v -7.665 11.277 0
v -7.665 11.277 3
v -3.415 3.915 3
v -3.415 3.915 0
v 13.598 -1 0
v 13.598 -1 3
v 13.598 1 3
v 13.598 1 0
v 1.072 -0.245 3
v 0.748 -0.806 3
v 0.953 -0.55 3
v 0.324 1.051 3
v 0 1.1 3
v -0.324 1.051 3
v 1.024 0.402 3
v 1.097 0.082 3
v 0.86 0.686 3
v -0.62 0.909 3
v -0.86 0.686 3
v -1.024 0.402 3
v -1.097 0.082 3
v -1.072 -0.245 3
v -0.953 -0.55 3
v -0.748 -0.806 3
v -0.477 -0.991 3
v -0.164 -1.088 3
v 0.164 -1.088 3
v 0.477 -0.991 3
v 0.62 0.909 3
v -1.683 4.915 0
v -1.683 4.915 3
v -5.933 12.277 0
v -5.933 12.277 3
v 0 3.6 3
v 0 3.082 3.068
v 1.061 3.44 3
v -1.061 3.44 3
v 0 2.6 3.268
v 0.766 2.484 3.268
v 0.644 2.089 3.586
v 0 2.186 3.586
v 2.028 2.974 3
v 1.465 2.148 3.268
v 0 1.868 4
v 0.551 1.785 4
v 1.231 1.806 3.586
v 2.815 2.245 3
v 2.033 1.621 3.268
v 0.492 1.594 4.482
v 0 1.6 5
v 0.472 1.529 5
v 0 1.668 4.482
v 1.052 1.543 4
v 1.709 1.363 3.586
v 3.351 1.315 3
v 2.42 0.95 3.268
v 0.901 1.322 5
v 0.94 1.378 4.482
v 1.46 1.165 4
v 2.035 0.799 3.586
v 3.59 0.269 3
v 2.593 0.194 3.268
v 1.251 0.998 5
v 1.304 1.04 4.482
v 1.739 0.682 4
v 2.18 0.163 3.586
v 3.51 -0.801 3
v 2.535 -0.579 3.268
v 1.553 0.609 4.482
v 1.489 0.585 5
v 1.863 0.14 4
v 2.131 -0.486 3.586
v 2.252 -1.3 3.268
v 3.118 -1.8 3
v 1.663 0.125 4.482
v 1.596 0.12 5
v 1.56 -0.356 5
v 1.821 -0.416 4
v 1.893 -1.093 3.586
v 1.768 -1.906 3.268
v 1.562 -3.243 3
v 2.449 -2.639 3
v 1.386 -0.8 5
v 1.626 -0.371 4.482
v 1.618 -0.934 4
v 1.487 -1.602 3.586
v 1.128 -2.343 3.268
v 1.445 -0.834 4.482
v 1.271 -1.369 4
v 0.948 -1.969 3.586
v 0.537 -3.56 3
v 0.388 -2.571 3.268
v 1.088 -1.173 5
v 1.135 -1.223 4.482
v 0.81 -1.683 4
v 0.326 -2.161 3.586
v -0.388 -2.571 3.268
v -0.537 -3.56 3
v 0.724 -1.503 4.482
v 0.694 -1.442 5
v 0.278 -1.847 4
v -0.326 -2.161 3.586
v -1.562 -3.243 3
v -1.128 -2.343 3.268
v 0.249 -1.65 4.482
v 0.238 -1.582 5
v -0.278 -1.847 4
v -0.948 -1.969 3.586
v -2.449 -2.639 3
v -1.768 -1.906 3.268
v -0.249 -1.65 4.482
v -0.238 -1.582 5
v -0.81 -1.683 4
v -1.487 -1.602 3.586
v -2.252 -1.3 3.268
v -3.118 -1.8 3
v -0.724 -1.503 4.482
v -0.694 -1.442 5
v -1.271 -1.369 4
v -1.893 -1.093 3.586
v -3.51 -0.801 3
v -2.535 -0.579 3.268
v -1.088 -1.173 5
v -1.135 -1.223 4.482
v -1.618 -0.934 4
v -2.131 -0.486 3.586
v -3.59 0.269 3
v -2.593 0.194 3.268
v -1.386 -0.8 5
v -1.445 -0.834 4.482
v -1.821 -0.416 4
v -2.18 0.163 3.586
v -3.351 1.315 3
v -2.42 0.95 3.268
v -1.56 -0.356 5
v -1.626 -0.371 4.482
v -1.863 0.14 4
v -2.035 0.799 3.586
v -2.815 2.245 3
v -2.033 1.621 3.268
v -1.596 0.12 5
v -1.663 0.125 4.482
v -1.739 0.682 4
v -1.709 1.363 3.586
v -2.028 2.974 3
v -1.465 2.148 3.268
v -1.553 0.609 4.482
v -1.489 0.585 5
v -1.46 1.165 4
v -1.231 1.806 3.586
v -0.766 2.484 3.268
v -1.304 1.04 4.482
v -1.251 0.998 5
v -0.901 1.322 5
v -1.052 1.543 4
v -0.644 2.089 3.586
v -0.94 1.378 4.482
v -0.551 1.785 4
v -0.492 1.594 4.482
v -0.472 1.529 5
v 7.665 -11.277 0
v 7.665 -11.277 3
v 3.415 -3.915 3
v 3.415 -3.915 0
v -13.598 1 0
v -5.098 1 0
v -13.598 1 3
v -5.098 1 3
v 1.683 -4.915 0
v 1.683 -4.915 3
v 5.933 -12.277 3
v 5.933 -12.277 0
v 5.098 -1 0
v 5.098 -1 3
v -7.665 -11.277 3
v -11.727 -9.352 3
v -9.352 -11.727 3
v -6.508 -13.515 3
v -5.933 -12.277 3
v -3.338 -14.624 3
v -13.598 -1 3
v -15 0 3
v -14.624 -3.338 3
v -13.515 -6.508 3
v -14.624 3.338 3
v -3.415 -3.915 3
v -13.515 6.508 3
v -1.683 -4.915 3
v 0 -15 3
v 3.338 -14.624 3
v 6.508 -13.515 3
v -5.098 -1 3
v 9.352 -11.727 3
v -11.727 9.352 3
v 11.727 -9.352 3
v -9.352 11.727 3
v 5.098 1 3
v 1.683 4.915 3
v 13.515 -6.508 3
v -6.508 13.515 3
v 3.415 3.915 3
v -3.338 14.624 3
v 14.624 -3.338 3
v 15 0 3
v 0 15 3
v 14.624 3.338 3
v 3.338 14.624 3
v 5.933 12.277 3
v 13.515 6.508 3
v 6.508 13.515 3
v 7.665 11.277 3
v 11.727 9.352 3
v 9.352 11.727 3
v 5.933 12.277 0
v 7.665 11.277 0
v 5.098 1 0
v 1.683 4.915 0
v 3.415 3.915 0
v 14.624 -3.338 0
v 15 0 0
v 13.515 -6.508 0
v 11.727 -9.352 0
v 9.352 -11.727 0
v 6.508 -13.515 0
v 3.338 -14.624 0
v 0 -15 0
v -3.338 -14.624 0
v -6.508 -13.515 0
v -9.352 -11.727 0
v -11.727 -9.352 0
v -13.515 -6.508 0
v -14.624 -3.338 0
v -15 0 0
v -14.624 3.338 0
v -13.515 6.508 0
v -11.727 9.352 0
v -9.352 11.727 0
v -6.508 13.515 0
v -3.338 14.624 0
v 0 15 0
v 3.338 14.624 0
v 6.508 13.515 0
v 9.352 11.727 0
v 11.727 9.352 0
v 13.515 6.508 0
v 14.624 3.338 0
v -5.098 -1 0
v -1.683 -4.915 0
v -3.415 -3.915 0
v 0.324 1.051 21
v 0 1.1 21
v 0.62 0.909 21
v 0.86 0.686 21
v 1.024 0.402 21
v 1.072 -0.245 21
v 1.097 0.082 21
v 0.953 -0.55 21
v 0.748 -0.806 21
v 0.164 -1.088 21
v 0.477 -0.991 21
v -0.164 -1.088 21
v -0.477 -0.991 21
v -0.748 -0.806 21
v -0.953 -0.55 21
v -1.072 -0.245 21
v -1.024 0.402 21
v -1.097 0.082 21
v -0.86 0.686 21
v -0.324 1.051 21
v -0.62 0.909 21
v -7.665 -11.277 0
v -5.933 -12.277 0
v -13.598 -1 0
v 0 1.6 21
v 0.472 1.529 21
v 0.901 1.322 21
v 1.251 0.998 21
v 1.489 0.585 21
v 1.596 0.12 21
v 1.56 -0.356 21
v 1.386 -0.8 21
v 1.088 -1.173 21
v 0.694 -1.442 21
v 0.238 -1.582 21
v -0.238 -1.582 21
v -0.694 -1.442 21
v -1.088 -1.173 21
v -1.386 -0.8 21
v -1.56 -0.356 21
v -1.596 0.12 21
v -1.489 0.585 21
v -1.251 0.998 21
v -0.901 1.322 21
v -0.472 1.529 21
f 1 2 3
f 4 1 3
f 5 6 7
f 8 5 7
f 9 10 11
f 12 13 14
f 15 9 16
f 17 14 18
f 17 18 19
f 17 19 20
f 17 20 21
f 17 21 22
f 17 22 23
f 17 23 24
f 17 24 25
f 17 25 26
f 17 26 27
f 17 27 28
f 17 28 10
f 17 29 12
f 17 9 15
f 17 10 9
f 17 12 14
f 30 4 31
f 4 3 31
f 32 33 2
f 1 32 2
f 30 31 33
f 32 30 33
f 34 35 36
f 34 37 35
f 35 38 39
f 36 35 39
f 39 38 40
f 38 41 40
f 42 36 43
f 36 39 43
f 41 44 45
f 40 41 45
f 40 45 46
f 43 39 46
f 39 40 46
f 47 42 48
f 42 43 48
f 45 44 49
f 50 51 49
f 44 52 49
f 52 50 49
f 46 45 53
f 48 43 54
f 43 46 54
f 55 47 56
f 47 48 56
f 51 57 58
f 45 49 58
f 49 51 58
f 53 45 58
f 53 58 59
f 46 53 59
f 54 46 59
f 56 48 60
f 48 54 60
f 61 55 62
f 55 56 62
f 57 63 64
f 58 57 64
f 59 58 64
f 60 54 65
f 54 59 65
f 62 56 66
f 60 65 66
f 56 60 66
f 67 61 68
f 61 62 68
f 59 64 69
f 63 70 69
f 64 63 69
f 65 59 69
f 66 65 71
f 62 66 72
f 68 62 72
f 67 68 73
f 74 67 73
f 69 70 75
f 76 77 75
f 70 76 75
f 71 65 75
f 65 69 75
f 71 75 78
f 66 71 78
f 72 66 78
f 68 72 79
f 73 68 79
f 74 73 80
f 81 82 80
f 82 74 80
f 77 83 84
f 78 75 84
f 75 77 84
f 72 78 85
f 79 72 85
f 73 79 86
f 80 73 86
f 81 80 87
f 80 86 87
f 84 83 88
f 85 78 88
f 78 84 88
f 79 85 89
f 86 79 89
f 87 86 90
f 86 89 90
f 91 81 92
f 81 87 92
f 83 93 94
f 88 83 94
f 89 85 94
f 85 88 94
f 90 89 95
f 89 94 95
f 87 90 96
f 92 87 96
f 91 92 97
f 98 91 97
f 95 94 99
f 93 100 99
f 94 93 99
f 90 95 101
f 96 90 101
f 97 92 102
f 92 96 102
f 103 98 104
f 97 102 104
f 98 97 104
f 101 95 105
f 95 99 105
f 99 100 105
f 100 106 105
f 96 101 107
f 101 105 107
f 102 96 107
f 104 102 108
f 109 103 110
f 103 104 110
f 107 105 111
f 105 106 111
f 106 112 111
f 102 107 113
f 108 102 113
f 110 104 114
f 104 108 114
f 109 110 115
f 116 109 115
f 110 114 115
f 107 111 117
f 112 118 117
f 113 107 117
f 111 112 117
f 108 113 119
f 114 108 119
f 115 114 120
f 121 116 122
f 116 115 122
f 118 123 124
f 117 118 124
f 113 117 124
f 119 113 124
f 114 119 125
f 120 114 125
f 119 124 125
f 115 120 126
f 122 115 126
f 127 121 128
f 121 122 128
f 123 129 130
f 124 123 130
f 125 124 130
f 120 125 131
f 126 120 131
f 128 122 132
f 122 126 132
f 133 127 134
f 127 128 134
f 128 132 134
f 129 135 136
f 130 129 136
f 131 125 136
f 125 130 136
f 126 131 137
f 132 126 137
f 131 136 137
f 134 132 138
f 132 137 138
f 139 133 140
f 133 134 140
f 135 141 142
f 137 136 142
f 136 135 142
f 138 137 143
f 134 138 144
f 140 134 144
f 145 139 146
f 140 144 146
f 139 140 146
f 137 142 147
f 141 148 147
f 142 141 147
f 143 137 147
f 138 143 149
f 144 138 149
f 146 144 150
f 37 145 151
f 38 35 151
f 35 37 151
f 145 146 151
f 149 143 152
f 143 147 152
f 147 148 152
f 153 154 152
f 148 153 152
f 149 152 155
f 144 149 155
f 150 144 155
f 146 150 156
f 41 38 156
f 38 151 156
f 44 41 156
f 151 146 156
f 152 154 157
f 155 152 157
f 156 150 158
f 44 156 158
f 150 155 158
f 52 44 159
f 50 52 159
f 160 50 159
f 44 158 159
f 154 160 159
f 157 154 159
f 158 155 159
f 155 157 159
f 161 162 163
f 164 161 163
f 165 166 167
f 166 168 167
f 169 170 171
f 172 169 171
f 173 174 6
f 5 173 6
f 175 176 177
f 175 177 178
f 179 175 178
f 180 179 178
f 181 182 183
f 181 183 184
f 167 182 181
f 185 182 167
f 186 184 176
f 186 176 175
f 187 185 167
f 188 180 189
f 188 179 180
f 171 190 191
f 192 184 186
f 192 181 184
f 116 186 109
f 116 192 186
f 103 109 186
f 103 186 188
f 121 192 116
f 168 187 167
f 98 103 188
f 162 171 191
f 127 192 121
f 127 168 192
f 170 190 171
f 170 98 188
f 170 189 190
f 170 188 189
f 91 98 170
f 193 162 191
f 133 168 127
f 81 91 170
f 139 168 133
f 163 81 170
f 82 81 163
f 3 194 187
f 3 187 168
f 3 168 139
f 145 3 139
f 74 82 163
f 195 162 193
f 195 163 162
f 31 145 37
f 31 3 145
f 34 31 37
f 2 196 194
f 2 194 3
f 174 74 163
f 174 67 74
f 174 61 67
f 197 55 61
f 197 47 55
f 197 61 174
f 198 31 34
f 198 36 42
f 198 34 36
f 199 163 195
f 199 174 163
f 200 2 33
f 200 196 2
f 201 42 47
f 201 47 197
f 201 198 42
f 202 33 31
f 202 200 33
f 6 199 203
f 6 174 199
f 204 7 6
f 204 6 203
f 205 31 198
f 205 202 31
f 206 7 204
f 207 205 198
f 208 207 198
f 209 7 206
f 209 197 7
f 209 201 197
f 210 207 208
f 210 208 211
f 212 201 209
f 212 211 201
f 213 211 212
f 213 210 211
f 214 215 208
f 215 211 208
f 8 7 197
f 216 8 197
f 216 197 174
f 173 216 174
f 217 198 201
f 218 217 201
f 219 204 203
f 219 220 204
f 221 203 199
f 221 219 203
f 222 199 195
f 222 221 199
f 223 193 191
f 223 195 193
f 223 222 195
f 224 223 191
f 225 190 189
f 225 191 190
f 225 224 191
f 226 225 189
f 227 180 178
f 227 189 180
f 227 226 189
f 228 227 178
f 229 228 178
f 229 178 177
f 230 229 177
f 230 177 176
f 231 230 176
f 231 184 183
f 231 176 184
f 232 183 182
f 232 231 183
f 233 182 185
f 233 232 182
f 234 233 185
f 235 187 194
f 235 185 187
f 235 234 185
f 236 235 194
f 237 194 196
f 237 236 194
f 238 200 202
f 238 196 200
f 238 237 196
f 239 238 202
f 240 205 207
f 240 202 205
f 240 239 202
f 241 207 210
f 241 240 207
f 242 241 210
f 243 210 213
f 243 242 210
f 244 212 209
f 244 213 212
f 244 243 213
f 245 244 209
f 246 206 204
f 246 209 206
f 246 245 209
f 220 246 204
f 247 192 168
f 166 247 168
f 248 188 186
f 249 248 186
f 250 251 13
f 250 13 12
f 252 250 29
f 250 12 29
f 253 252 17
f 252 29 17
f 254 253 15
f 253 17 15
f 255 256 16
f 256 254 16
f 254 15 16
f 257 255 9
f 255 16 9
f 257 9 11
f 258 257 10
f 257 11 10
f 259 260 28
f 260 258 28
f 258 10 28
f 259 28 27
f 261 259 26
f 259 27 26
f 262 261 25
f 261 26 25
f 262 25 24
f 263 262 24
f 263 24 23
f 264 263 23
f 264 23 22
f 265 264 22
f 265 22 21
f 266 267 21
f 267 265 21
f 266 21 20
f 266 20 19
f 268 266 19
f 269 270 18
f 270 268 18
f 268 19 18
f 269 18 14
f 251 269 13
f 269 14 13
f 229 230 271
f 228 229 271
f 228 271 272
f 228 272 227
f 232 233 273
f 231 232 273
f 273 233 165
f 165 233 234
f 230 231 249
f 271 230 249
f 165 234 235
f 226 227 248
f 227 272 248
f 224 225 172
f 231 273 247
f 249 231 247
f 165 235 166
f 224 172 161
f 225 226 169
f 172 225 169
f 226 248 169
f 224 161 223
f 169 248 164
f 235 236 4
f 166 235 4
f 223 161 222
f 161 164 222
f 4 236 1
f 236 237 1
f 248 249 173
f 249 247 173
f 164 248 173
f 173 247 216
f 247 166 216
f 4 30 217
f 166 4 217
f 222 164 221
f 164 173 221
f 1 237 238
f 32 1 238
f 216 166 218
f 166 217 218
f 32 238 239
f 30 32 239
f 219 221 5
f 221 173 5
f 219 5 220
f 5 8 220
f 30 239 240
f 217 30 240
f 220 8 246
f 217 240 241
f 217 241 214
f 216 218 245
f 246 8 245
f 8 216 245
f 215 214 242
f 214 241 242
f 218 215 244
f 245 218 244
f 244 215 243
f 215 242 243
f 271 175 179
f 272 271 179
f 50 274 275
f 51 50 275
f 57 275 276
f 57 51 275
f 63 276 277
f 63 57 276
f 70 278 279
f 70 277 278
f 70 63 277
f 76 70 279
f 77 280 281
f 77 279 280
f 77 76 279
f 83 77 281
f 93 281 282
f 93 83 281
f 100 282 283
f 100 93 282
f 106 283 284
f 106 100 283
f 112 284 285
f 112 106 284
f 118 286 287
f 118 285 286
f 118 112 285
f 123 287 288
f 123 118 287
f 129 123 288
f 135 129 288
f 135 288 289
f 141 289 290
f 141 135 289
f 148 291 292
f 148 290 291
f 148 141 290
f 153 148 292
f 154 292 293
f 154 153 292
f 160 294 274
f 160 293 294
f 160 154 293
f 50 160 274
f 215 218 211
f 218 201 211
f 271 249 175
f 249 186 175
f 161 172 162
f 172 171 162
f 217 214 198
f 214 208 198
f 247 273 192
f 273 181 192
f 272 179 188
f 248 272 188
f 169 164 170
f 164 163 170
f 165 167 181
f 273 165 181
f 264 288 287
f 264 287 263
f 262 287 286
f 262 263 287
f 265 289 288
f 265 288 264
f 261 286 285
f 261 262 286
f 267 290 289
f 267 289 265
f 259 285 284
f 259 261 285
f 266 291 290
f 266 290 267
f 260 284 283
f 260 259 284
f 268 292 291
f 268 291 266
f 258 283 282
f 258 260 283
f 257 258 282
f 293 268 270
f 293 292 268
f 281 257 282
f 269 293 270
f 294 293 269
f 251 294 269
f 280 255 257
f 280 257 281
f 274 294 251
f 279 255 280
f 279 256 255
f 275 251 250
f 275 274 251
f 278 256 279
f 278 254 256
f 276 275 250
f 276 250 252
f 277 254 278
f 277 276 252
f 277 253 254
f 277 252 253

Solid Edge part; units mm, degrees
sketch "Sketch1" plane through (0, 0, 0) normal (0, 0, 1) x (1, 0, 0)
  circle A0 centre (0, 0) radius 15
extrude "Protrusion1" add sketch "Sketch1" along normal blind 3
sketch "Sketch2" plane through (0, 0, 3) normal (0, 0, 1) x (0, 1, 0)
  circle A0 centre (0, 0) radius 1.6
  circle A1 centre (0, 0) radius 1.1
extrude "ExtrudedProtrusion_2" add sketch "Sketch2" along normal blind 18
fillet "Round_1" radius 2 1 edges at (0, -1.6, 3)
sketch "Sketch3" plane through (0, 0, 3) normal (0, 0, 1) x (0, 1, 0)
  line L0 (1, -13.5985) -> (1, -5.0985)
  line L1 (1, -5.0985) -> (-1, -5.0985)
  line L2 (-1, -5.0985) -> (-1, -13.5985)
  line L3 (-1, -13.5985) -> (1, -13.5985)
extrude "Cutout1" cut sketch "Sketch3" against normal up to next
pattern_circular "Pattern1" count 6 over 360 about axis through (0, 0, 3) along (0, 0, 1) of "Cutout1"
